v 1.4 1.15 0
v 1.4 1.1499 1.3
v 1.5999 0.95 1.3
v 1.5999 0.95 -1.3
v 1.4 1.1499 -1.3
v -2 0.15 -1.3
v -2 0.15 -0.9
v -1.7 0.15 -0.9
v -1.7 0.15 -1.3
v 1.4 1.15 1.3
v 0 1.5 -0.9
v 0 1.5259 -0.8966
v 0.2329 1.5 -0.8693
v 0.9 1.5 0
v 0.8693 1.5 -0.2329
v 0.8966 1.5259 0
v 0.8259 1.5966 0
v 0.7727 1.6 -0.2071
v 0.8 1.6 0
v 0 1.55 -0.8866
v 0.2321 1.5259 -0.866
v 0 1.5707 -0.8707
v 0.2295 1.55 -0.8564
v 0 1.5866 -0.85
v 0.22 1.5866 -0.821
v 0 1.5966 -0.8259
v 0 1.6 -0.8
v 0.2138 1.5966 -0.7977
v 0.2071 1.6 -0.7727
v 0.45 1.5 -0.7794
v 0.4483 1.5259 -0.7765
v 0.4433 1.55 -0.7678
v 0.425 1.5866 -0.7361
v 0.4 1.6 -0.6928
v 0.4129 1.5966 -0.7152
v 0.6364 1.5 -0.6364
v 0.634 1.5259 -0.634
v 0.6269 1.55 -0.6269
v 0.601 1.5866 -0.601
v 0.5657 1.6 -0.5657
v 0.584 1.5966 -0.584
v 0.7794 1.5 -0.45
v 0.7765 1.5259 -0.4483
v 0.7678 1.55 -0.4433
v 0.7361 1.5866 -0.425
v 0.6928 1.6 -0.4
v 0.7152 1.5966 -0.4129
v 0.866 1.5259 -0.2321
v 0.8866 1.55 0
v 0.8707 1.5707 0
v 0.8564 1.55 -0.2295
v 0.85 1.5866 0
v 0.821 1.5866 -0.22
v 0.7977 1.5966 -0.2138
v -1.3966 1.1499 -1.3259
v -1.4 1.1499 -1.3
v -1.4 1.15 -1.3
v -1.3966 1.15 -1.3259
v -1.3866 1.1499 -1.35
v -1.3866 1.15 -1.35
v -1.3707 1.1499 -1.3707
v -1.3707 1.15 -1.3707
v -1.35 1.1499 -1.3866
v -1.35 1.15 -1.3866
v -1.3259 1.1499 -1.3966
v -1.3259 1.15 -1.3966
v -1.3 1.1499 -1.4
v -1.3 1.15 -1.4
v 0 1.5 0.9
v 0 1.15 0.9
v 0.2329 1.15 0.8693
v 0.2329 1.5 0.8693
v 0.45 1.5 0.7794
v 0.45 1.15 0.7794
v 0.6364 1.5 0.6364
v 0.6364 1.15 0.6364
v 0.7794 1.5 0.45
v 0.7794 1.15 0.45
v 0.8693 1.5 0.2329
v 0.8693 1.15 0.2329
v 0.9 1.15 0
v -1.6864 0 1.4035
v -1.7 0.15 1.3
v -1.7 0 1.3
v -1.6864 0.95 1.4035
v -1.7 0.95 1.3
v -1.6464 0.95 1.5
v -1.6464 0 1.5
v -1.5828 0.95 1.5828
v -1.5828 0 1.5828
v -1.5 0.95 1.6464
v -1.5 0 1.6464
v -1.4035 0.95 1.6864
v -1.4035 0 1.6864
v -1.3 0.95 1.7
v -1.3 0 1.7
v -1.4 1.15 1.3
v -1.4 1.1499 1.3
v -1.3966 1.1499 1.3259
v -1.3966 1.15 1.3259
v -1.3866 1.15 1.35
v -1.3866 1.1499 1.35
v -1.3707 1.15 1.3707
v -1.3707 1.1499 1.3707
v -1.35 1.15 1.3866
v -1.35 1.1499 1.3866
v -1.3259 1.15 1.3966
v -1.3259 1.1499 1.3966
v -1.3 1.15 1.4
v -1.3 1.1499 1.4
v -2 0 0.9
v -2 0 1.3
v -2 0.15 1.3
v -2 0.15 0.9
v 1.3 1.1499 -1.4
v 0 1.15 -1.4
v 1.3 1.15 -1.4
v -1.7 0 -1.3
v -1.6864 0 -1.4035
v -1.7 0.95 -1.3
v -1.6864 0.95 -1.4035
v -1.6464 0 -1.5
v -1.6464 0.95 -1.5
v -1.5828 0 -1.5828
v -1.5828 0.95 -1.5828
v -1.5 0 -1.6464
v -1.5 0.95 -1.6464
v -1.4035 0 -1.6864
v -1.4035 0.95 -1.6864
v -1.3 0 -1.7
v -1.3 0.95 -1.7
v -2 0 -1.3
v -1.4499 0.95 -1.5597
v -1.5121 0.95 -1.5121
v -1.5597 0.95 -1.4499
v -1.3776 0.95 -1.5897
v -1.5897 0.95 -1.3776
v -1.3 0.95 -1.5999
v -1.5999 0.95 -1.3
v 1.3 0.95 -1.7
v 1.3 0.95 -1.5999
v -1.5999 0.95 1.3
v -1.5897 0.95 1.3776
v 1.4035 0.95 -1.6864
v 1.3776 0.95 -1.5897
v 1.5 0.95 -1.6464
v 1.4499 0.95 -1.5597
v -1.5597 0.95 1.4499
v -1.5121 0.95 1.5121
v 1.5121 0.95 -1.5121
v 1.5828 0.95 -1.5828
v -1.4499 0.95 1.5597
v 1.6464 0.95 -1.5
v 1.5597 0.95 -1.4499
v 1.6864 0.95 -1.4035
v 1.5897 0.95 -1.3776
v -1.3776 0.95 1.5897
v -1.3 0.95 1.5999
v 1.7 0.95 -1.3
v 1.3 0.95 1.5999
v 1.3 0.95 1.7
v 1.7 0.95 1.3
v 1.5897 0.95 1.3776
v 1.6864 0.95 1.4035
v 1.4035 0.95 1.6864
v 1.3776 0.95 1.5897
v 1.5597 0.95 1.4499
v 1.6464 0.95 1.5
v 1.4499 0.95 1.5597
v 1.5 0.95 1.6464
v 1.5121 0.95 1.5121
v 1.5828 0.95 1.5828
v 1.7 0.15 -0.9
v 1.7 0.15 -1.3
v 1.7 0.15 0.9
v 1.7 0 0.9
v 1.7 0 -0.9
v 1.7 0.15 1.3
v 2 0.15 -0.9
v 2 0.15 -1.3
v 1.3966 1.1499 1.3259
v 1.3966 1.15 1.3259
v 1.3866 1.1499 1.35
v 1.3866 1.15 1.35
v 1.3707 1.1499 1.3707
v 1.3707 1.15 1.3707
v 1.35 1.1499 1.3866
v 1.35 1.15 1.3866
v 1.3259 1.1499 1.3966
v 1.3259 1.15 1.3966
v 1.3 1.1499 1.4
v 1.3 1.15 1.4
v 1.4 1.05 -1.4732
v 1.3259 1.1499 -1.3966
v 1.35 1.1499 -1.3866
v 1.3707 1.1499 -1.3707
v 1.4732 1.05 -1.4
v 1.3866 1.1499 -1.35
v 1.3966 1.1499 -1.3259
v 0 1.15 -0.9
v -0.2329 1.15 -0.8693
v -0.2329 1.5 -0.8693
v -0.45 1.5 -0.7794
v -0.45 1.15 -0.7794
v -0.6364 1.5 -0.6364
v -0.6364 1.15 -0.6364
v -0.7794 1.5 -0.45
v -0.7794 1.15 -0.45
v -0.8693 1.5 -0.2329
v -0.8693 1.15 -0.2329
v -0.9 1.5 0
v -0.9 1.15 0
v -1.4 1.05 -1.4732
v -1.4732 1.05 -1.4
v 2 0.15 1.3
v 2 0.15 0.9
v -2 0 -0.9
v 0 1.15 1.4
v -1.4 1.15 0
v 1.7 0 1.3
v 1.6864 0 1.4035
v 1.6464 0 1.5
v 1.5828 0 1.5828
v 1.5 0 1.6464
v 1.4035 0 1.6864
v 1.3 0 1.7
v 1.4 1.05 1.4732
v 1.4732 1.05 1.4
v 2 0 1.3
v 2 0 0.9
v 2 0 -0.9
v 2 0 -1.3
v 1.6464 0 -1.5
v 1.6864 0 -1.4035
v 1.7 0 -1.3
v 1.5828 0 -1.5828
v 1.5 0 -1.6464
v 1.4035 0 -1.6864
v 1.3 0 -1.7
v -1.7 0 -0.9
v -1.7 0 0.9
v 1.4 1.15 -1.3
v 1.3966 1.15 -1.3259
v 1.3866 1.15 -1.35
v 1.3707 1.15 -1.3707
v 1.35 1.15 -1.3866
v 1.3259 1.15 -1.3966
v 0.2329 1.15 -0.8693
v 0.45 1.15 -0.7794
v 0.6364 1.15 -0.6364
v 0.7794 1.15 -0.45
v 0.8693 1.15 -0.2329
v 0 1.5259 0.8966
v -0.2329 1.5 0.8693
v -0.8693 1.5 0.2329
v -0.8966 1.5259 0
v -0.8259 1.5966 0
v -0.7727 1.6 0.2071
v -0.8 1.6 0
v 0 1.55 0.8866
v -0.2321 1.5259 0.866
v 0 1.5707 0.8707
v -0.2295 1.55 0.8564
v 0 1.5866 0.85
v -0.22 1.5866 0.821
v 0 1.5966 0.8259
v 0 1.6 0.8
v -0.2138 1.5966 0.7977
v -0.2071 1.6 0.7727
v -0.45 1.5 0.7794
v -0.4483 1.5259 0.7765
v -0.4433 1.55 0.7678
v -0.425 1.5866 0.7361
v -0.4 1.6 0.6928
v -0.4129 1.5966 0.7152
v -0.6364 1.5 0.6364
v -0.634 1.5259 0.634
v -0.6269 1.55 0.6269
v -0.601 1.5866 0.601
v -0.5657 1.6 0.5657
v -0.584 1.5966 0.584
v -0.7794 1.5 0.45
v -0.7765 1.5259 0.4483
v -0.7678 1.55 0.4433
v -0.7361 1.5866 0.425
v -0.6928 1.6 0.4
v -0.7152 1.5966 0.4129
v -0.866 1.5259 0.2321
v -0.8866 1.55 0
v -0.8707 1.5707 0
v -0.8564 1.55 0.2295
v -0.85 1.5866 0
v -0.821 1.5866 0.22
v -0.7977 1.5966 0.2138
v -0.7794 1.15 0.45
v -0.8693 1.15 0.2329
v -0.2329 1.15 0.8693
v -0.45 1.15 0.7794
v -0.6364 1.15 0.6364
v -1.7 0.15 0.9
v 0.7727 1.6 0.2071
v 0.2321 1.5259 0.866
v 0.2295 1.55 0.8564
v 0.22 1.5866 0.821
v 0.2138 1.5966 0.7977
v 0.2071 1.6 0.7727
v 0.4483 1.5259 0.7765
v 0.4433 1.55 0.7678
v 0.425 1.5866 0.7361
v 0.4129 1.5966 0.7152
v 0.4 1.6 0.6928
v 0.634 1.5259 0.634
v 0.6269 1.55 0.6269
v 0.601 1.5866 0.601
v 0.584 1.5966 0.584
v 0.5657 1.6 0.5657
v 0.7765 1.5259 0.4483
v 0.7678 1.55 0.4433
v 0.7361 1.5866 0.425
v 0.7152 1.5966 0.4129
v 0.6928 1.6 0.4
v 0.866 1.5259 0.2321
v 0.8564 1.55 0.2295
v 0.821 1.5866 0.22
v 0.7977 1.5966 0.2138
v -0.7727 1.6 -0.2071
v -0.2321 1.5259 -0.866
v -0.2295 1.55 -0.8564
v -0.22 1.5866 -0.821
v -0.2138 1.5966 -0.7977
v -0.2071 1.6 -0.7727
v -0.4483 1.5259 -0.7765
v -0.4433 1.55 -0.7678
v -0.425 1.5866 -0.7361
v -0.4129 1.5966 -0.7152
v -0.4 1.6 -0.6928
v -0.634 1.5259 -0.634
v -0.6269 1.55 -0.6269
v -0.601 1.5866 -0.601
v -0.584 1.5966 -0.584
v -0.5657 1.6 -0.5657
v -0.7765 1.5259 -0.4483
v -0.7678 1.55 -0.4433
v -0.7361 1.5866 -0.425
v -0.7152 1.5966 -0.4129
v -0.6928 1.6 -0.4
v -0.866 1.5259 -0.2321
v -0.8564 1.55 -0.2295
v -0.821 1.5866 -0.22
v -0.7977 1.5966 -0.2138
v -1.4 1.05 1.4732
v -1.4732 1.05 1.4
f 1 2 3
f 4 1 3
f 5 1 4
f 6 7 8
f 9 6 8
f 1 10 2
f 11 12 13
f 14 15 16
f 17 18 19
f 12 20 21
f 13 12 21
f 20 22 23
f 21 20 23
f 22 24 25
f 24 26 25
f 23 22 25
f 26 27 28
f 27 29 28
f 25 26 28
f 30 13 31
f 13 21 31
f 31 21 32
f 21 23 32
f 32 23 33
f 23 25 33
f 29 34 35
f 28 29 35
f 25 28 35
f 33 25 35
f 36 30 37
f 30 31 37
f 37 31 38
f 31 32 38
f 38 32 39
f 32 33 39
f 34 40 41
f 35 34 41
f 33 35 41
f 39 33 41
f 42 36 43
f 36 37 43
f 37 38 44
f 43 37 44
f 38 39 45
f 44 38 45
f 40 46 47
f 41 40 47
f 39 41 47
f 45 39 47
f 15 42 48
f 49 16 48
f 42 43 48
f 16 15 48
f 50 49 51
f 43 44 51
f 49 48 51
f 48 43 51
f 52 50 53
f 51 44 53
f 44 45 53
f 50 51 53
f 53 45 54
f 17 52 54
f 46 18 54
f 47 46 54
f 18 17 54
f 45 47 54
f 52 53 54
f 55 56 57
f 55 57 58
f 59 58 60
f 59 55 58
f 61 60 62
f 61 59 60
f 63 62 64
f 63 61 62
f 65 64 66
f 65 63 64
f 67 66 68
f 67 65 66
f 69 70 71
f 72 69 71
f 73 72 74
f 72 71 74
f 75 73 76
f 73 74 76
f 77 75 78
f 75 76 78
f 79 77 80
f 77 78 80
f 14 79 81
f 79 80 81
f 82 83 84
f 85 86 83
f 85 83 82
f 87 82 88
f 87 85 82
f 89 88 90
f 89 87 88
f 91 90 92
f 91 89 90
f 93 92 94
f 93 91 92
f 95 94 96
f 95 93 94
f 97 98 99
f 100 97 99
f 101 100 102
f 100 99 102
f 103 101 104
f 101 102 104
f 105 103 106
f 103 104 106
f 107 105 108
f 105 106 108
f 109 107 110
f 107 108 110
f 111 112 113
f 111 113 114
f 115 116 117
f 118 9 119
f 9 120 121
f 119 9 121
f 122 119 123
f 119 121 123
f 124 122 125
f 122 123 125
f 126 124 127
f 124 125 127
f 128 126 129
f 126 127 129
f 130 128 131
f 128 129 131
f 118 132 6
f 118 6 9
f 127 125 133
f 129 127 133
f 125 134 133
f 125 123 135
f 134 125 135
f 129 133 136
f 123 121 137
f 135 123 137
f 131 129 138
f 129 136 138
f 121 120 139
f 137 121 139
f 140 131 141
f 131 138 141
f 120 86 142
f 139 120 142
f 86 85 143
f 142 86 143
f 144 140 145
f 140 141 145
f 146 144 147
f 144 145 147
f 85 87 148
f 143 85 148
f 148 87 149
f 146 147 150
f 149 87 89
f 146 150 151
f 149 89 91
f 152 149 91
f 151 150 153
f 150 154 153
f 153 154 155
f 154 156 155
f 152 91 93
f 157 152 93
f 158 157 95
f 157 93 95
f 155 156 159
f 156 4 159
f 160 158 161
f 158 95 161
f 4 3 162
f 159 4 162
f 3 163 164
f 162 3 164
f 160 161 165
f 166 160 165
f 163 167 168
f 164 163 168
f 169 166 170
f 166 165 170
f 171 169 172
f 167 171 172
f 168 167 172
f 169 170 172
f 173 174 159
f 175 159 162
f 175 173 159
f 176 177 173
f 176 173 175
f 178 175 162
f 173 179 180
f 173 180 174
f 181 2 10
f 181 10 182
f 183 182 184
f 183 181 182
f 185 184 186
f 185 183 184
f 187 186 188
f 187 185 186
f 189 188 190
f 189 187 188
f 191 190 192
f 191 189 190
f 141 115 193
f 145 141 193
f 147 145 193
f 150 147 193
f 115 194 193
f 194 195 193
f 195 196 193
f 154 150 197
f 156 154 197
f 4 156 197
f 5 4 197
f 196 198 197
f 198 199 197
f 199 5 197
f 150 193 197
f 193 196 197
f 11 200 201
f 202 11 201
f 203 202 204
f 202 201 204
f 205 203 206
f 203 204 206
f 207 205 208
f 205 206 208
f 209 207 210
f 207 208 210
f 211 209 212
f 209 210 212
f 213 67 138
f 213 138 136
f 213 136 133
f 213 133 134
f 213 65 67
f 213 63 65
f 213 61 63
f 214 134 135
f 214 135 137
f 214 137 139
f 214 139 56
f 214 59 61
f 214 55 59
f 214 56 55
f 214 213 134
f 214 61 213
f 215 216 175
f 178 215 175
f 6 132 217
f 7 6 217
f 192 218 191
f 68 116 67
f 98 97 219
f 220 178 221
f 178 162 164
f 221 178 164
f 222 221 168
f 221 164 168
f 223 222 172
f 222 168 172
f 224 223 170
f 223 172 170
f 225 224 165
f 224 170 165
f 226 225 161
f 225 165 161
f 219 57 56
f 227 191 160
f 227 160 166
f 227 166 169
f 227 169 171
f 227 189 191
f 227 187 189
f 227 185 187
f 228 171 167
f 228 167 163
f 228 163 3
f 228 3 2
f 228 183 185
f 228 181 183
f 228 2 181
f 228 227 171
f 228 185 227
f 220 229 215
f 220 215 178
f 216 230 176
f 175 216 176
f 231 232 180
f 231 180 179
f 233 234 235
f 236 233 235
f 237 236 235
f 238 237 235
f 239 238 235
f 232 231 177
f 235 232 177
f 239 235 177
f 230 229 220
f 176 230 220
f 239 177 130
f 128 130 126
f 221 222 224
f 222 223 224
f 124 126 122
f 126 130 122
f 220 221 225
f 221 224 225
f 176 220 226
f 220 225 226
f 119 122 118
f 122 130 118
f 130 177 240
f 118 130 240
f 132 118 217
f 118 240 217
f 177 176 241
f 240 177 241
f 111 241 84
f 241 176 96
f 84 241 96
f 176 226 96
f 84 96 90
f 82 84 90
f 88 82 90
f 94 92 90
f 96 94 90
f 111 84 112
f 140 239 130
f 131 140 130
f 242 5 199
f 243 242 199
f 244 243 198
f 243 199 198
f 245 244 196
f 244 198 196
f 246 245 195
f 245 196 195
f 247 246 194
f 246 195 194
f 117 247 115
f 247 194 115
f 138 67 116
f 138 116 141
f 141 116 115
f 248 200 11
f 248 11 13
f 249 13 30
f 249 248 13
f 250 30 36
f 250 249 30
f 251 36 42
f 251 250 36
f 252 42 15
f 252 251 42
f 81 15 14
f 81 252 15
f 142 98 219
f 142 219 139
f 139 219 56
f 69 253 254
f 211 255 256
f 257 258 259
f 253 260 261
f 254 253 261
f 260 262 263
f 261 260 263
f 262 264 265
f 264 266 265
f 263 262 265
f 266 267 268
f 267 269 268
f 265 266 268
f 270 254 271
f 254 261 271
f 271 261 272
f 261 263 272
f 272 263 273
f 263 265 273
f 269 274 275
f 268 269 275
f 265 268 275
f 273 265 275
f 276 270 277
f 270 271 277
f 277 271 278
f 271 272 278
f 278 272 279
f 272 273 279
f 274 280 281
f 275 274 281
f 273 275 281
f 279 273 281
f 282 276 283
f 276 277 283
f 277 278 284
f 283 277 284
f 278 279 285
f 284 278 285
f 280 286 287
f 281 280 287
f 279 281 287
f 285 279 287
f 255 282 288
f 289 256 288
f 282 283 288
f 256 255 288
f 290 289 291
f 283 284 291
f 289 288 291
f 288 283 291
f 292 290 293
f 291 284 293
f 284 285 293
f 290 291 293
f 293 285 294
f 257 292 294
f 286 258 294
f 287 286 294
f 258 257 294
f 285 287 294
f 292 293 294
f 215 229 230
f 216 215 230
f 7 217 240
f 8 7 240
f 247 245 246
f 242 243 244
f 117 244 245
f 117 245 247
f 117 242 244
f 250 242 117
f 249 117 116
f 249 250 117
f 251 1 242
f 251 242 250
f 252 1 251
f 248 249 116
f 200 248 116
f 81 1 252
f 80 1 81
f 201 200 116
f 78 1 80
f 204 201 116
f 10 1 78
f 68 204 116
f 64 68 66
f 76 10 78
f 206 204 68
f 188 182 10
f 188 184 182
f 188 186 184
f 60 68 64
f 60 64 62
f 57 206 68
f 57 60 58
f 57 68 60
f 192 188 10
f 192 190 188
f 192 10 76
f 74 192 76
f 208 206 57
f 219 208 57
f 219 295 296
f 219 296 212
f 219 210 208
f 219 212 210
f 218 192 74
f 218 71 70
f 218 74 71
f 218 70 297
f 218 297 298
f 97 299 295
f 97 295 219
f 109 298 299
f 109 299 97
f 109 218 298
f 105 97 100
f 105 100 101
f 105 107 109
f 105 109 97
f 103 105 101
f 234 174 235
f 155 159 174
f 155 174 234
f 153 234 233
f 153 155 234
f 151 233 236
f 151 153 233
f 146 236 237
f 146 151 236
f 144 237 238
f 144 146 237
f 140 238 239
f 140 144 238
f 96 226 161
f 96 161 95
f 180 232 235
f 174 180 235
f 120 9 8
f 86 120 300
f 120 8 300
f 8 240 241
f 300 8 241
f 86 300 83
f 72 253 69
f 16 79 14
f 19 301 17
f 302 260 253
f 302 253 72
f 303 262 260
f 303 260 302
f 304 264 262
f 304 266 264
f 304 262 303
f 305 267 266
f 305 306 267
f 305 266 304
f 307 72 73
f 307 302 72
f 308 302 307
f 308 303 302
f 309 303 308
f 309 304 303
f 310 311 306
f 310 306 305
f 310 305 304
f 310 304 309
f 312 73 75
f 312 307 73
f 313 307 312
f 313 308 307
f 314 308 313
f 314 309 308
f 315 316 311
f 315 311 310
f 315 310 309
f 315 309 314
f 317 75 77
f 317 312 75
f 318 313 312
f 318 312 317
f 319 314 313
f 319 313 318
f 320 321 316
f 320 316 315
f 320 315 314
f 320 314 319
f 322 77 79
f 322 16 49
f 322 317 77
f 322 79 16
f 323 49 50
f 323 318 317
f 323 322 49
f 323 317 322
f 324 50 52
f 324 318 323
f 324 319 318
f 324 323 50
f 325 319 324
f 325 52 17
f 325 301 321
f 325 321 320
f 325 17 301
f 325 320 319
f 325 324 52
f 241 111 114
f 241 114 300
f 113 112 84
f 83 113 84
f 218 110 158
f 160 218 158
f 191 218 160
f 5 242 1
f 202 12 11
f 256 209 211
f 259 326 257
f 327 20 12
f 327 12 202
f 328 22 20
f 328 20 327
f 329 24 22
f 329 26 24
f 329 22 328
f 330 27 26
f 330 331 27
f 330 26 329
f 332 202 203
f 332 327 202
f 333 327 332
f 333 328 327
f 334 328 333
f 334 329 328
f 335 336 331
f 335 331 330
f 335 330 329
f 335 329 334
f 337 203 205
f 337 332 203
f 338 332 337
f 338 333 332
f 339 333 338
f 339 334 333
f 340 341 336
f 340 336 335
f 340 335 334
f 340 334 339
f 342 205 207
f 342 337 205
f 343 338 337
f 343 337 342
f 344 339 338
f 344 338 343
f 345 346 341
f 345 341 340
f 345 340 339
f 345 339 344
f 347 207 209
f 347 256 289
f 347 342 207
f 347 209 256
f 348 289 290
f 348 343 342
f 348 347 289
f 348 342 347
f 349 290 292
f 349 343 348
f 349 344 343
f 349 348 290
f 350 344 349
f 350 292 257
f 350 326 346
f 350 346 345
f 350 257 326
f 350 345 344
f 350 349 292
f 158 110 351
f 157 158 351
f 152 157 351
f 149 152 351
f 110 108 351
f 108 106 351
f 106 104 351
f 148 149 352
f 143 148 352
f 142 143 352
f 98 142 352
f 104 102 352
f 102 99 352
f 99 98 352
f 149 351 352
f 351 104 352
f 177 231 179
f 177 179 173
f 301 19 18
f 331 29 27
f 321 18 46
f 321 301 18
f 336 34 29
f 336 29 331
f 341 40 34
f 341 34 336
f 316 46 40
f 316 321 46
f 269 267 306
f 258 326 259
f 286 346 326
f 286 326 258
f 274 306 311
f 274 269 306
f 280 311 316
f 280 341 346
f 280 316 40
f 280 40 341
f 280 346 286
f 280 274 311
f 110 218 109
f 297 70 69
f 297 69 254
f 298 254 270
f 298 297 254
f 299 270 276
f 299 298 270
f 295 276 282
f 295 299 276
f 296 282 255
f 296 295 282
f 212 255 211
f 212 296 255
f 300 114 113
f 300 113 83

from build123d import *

# Parameters (mm, degrees)
SKETCH_1_W          = 1.7
SKETCH_1_H          = 1.7
EXTRUDE_1_DEPTH     = 1.15
EXTRUDE_2_DEPTH     = 0.45
SKETCH_3_W          = 0.3
SKETCH_3_H          = 0.4
EXTRUDE_3_DEPTH     = 0.15
CUT_EXTRUDE_1_DEPTH = 0.2
FILLET_1_R          = 0.4
FILLET_2_R          = 0.1
CHAMFER_1_SIZE      = 0.2
FILLET_3_R          = 0.1


with BuildPart() as part:
    # 草图1 → 凸台-拉伸1 (new body)
    with BuildSketch(Plane(origin=(0, 0, 0), x_dir=(1, 0, 0), z_dir=(0, 1, 0))):
        with Locations((-0.85, 0.85)):
            Rectangle(SKETCH_1_W, SKETCH_1_H)
    extrude(amount=EXTRUDE_1_DEPTH)

    # 草图2 → 凸台-拉伸2 (add)
    with BuildSketch(Plane(origin=(0, 1.15, 0), x_dir=(1, 0, 0), z_dir=(0, 1, 0))):
        with BuildLine():
            Line((-0.9, 0), (0, 0))
            Line((0, 0), (0, 0.9))
            ThreePointArc((0, 0.9), (-0.636396103, 0.636396103), (-0.9, 0))
        make_face()
    extrude(amount=EXTRUDE_2_DEPTH)

    # 草图3 → 凸台-拉伸3 (add)
    with BuildSketch(Plane.XZ):
        with Locations((-1.85, -1.1)):
            Rectangle(SKETCH_3_W, SKETCH_3_H)
    extrude(amount=-EXTRUDE_3_DEPTH)

    # 草图4 → 切除-拉伸1 (cut)
    with BuildSketch(Plane(origin=(0, 1.15, 0), x_dir=(1, 0, 0), z_dir=(0, 1, 0))):
        Polygon((0, 1.4), (-1.4, 1.4), (-1.4, 0), (-1.7, 0), (-1.7, 1.7), (0, 1.7), align=None)
    extrude(amount=-CUT_EXTRUDE_1_DEPTH, mode=Mode.SUBTRACT)

    # 圆角1
    fillet_1_edges = [part.edges().sort_by_distance(p)[0] for p in [
        (-1.7, 0.475, -1.7),
    ]]
    fillet(fillet_1_edges, radius=FILLET_1_R)

    # 圆角2
    fillet_2_edges = [part.edges().sort_by_distance(p)[0] for p in [
        (-1.4, 1.05, -1.4),
    ]]
    fillet(fillet_2_edges, radius=FILLET_2_R)

    # 倒角1
    chamfer_1_edges = [part.edges().sort_by_distance(p)[0] for p in [
        (-1.4, 0.95, -0.65),
        (-1.370710678, 0.95, -1.370710678),
        (-0.65, 0.95, -1.4),
    ]]
    chamfer(chamfer_1_edges, length=CHAMFER_1_SIZE - 0.0001)  # a hair under: the kernel refuses the full size

    # 圆角3
    fillet_3_edges = [part.edges().sort_by_distance(p)[0] for p in [
        (-0.636396103, 1.6, -0.636396103),
    ]]
    fillet(fillet_3_edges, radius=FILLET_3_R)

    # 镜向1: part across plane


with BuildPart() as part_1:
    add(part.part)
    add(part.part.mirror(Plane(origin=(0, 1.15, 0), x_dir=(0, 0, 1), z_dir=(-1, 0, 0))))

    # 镜向2: part across plane


with BuildPart() as part_2:
    add(part_1.part)
    add(part_1.part.mirror(Plane(origin=(0, 1.15, 0), x_dir=(1, 0, 0), z_dir=(0, 0, -1))))


solid = part_2.part
